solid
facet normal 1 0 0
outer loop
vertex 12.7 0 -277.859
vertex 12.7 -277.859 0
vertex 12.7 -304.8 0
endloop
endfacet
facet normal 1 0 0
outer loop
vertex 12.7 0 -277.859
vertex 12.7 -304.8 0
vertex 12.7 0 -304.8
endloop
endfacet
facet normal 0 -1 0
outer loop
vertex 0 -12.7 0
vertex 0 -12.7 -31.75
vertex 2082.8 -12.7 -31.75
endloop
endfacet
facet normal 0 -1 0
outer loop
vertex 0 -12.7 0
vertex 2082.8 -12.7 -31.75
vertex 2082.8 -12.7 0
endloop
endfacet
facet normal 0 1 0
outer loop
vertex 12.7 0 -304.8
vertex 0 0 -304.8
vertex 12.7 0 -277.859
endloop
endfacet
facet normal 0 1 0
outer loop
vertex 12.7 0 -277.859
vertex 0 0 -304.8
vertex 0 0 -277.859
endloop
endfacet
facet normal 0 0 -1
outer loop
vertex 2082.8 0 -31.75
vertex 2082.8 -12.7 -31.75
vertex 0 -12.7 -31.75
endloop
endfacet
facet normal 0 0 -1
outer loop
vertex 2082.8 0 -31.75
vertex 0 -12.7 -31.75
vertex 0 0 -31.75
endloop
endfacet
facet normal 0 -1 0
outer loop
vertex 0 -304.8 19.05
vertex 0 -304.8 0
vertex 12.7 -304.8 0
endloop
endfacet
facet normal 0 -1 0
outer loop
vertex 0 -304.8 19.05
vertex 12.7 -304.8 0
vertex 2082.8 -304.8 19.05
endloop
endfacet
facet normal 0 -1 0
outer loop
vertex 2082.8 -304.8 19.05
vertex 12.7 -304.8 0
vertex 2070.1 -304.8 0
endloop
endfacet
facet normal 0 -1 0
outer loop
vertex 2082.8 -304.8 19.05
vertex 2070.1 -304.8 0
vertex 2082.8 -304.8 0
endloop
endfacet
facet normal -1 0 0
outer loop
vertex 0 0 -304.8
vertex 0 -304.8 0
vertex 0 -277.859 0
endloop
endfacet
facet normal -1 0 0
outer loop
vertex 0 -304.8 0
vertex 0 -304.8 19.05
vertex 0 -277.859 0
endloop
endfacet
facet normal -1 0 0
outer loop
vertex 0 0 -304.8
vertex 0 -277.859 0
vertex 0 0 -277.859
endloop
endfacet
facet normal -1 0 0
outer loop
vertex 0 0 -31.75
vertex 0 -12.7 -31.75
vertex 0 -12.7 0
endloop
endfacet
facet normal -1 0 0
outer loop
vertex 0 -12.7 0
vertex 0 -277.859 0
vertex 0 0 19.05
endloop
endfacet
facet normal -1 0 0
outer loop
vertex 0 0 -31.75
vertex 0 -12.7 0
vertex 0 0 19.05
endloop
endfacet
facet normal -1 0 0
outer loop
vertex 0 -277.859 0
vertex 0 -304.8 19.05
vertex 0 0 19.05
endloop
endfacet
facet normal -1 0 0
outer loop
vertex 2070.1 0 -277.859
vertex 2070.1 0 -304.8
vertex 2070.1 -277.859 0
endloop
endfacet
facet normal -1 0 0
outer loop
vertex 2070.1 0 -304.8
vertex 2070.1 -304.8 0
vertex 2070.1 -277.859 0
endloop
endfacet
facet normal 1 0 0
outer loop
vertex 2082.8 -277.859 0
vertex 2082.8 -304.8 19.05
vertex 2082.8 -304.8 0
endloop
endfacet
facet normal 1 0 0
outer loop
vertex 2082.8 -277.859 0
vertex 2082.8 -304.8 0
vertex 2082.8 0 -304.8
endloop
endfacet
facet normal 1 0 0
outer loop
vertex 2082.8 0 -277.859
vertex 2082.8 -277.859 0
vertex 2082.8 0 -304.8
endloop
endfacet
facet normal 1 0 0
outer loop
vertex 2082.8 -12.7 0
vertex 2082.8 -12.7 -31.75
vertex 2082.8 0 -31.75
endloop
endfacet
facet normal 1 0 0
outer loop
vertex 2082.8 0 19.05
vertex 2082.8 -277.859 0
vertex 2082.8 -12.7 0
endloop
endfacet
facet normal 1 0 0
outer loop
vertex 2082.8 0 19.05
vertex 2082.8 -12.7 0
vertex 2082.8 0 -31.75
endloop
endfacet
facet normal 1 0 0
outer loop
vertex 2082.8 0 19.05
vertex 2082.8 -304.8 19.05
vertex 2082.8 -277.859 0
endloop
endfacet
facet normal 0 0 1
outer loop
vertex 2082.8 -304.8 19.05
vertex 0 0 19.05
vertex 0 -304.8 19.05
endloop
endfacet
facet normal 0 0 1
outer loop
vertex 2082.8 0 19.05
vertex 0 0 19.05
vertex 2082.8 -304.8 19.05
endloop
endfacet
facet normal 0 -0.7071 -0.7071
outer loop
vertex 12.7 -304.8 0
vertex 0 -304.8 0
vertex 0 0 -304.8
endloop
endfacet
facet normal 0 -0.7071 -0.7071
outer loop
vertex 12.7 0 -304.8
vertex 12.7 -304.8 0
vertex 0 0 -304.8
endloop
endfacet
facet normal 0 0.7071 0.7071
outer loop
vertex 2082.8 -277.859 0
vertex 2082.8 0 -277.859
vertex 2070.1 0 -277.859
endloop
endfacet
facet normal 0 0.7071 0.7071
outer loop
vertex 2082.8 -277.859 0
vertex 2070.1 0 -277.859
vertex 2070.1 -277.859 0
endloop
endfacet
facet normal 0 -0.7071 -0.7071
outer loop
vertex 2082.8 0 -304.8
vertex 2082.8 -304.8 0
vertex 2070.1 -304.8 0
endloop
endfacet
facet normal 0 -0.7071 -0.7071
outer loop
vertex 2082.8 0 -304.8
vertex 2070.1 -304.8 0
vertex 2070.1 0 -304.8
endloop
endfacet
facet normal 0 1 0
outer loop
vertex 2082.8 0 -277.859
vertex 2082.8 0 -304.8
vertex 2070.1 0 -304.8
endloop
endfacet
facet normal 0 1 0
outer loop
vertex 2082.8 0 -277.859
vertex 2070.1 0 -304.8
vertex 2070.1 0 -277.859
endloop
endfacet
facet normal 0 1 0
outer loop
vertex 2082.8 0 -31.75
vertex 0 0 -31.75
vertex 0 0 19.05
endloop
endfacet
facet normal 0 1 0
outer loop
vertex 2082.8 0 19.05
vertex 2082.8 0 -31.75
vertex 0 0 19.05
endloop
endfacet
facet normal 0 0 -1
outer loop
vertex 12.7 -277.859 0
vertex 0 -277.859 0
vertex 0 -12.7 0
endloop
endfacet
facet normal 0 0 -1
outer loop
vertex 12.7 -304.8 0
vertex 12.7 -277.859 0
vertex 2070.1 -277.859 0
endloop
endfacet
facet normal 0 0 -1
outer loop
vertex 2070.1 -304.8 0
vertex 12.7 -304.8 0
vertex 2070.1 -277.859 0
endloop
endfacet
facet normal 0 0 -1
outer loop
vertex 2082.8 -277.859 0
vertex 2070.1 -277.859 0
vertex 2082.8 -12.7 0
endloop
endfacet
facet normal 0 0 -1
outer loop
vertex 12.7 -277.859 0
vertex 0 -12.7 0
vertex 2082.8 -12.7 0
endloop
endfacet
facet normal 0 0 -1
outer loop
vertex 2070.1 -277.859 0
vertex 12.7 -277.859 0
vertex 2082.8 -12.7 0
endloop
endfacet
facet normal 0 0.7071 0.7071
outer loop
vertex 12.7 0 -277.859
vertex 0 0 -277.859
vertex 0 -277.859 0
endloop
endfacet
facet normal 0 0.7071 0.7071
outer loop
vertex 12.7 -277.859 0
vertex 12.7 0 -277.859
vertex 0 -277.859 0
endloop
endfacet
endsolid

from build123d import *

# Parameters (mm, degrees)
F0_W     = 2082.8
F0_H     = 304.8
F1_DEPTH = 19.05
F2_W     = 12.7
F2_H     = 31.75
F3_DEPTH = 2082.8
F5_DEPTH = 12.7
F7_DEPTH = 12.7


with BuildPart() as f1:
    # F0 (on Top) → F1 (new body)
    with BuildSketch(Plane.XY):
        with Locations((1041.4, -152.4)):
            Rectangle(F0_W, F0_H)
    extrude(amount=F1_DEPTH)

    # F2 (on Right) → F3 (join, through all)
    with BuildSketch(Plane.YZ):
        with Locations((-6.35, -15.875)):
            Rectangle(F2_W, F2_H)
    extrude(amount=F3_DEPTH)

    # F4 (on Right) → F5 (join)
    with BuildSketch(Plane.YZ):
        Polygon((-277.859232, 0), (-304.8, 0), (0, -304.8), (0, -277.859232), align=None)
    extrude(amount=F5_DEPTH)

    # F6 (on face) → F7 (join)
    with BuildSketch(Plane.YZ.offset(2082.8)):
        Polygon((0, -304.8), (0, -277.859232), (-277.859232, 0), (-304.8, 0), align=None)
    extrude(amount=-F7_DEPTH)


solid = f1.part
